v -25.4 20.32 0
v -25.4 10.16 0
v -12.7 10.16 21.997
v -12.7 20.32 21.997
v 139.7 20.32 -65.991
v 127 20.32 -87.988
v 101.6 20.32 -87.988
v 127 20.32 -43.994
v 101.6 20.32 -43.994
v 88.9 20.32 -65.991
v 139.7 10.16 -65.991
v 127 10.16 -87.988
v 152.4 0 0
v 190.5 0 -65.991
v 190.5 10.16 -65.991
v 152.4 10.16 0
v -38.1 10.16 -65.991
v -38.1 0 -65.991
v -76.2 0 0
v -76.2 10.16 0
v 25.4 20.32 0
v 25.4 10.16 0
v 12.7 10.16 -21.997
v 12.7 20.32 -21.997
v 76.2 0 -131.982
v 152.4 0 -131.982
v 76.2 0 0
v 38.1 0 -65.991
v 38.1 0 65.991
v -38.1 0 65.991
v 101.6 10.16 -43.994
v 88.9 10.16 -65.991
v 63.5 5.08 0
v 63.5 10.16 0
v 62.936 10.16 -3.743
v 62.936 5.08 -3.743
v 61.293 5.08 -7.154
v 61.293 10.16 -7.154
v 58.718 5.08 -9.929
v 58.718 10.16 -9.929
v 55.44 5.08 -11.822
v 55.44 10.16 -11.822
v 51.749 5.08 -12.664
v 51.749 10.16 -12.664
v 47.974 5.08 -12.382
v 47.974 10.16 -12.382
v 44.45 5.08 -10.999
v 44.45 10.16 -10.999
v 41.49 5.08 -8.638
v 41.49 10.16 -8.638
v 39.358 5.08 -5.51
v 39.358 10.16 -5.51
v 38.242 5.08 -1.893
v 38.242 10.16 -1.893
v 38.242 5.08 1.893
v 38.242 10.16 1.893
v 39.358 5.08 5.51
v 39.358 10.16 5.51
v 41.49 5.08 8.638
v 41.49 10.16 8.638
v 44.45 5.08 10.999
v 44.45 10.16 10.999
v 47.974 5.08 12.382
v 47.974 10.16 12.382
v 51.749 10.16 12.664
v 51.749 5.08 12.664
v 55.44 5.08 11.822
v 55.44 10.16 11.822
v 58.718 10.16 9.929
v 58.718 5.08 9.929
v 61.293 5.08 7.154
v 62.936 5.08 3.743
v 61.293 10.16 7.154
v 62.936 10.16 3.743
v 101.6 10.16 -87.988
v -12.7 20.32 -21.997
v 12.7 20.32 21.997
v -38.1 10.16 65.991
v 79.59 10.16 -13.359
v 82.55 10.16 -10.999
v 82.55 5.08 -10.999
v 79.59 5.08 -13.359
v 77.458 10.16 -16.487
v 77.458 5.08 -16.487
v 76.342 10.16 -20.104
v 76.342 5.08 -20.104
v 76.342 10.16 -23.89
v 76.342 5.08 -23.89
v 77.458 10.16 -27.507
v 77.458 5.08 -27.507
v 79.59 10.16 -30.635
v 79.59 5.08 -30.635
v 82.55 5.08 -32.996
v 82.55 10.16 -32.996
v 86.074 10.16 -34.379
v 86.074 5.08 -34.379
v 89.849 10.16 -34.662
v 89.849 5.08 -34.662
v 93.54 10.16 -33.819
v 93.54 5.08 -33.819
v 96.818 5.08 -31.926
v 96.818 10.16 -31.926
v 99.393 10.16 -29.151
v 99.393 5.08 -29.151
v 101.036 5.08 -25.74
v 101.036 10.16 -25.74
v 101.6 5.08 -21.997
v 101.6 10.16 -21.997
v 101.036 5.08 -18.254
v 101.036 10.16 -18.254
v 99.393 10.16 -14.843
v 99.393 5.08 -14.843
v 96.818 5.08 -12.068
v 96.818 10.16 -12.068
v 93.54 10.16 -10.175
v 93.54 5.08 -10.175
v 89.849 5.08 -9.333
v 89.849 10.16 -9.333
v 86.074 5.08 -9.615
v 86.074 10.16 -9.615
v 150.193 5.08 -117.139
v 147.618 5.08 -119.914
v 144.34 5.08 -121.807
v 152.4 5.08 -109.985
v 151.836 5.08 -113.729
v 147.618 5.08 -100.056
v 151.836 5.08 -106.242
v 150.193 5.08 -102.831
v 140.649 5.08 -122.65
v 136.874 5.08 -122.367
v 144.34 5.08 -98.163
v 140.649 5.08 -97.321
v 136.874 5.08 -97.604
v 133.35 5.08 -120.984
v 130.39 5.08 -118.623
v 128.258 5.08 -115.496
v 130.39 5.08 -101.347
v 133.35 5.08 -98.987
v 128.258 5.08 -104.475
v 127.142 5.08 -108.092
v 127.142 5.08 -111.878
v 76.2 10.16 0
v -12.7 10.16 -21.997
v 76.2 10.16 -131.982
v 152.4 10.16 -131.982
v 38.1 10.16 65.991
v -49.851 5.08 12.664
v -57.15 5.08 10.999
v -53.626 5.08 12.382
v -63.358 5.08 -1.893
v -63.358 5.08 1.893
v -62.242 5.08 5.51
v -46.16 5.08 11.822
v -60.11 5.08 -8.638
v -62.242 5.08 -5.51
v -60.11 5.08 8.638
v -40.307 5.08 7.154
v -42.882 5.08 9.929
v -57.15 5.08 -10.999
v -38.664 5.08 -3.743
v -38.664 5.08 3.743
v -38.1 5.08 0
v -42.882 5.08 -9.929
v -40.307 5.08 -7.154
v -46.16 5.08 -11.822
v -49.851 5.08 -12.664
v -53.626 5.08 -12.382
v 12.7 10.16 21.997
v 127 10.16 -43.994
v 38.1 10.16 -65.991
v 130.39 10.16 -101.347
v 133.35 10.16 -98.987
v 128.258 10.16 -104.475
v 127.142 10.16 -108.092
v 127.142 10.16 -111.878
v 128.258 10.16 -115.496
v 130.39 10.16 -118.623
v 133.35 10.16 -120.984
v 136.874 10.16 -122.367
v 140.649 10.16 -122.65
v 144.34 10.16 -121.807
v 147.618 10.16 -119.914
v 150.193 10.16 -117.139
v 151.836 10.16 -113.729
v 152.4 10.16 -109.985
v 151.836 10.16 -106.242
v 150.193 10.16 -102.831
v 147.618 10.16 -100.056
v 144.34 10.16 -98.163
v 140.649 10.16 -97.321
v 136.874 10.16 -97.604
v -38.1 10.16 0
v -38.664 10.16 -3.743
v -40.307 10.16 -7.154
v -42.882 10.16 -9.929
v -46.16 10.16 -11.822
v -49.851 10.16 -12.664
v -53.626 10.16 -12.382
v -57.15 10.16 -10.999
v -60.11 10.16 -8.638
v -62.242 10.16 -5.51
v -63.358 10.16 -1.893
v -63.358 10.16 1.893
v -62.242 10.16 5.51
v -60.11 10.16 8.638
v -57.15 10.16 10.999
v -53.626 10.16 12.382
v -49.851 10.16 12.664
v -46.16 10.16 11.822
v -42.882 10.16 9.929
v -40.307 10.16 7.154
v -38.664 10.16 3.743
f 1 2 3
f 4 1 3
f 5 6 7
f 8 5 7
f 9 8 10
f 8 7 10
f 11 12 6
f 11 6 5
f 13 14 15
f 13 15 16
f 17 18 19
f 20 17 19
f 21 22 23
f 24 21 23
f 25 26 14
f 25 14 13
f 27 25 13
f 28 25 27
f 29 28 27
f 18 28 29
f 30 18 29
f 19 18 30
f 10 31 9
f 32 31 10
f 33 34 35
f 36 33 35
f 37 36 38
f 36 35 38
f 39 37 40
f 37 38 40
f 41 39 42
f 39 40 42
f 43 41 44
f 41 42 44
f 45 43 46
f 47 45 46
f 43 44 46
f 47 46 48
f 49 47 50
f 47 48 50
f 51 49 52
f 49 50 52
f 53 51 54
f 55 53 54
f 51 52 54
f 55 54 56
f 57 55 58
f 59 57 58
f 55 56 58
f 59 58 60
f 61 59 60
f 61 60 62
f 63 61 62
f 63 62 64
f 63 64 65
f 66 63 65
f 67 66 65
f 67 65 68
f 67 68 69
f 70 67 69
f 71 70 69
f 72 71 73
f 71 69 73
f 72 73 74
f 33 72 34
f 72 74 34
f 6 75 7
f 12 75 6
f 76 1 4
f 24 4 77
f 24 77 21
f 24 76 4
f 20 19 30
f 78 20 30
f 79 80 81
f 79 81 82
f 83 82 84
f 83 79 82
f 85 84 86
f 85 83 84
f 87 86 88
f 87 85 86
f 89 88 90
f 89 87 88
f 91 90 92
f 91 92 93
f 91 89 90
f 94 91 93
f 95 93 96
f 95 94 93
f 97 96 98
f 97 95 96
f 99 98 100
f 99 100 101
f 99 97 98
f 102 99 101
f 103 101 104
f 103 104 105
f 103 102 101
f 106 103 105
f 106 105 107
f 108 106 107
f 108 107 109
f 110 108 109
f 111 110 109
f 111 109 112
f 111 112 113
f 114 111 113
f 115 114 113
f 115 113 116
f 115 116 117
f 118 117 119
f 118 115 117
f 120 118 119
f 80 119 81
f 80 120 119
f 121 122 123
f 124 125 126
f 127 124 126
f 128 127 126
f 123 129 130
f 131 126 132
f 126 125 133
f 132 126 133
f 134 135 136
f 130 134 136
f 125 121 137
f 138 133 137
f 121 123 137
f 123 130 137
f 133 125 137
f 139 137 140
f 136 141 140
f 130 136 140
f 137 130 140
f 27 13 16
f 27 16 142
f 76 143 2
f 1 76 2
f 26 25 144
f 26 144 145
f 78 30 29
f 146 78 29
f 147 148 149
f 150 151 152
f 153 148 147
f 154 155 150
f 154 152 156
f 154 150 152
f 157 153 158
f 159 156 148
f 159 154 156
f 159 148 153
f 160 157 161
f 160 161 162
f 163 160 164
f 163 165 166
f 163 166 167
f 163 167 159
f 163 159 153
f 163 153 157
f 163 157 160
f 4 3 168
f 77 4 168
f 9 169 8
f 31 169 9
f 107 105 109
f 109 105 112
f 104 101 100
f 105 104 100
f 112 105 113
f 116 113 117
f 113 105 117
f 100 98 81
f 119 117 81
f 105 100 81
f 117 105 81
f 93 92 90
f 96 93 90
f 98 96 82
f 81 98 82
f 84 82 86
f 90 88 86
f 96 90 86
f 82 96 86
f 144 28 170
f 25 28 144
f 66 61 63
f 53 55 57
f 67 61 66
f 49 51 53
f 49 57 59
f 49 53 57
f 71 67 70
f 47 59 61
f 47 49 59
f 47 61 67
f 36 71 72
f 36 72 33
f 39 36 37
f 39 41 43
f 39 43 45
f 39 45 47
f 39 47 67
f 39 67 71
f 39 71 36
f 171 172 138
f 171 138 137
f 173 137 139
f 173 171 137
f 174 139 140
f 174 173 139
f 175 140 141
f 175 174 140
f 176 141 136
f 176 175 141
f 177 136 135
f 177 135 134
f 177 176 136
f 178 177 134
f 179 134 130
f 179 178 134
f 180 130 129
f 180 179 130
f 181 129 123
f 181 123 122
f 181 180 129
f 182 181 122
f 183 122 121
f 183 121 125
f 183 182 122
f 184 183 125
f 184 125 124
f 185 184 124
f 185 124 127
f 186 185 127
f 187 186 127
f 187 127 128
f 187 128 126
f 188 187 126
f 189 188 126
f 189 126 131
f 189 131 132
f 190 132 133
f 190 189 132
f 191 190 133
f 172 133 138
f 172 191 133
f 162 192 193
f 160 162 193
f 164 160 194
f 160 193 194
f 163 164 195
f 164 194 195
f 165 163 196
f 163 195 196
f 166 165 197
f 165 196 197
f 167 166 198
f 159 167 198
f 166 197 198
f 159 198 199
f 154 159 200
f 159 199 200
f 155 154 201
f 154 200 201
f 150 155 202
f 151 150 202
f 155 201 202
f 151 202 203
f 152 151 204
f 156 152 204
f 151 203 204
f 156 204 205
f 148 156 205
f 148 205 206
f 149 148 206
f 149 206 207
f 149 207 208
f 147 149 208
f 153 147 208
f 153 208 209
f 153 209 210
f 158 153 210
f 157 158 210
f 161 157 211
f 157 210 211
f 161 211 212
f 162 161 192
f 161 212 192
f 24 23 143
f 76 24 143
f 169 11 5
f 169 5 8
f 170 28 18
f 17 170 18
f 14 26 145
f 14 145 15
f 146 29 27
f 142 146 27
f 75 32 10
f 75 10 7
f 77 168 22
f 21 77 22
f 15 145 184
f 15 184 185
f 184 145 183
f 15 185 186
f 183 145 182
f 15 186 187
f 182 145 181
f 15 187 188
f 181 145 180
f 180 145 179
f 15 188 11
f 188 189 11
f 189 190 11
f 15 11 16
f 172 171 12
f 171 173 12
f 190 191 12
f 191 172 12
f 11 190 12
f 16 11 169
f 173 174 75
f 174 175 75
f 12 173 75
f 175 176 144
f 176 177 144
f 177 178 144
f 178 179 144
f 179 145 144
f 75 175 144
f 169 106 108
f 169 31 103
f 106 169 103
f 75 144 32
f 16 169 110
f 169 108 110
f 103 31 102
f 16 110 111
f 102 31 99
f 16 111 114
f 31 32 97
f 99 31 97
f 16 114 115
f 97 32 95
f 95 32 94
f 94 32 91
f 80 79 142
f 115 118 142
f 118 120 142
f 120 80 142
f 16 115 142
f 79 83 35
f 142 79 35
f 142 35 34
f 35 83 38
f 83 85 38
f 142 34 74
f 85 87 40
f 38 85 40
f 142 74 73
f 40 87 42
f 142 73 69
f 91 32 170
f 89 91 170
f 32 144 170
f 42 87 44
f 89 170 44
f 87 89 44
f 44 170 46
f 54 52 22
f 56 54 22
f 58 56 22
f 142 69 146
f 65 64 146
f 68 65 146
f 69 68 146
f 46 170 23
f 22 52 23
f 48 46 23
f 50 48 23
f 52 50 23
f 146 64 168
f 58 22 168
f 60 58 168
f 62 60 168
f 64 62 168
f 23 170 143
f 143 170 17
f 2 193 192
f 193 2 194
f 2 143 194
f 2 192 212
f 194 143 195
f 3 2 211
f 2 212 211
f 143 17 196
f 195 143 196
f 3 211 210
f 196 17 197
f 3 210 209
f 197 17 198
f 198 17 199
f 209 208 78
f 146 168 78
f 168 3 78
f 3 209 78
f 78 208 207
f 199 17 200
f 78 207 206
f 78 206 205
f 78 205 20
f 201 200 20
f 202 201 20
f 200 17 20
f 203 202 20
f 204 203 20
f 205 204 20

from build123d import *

# Parameters (mm, degrees)
BOSS_EXTRUDE1_DEPTH = 10.16
SKETCH2_R           = 12.7
CUT_EXTRUDE1_DEPTH  = 5.08
BOSS_EXTRUDE2_DEPTH = 10.16


with BuildPart() as part:
    # Sketch1 → Boss-Extrude1 (new body)
    with BuildSketch(Plane(origin=(0, 0, 0), x_dir=(1, 0, 0), z_dir=(0, 1, 0))):
        Polygon((38.1, 65.991135768), (-38.1, 65.991135768), (-76.2, 0), (-38.1, -65.991135768), (38.1, -65.991135768), (76.2, 0), align=None)
    boss_extrude1 = extrude(amount=BOSS_EXTRUDE1_DEPTH)

    # Sketch2 → Cut-Extrude1 (cut)
    with BuildSketch(Plane(origin=(0, 10.16, 0), x_dir=(1, 0, 0), z_dir=(0, 1, 0))):
        with Locations((-50.8, 0)):
            Circle(SKETCH2_R)
        with Locations((50.8, 0)):
            Circle(SKETCH2_R)
    cut_extrude1 = extrude(amount=-CUT_EXTRUDE1_DEPTH, mode=Mode.SUBTRACT)

    # Mirror1: Boss-Extrude1, Cut-Extrude1 across plane
    add(boss_extrude1.mirror(Plane(origin=(76.2, 10.16, 0), x_dir=(0.5, 0, 0.866025404), z_dir=(-0.866025404, 0, 0.5))))
    add(cut_extrude1.mirror(Plane(origin=(76.2, 10.16, 0), x_dir=(0.5, 0, 0.866025404), z_dir=(-0.866025404, 0, 0.5))), mode=Mode.SUBTRACT)

    # Sketch3 → Boss-Extrude2 (add)
    with BuildSketch(Plane(origin=(0, 10.16, 0), x_dir=(1, 0, 0), z_dir=(0, 1, 0))):
        Polygon((12.7, 21.997045256), (-12.7, 21.997045256), (-25.4, 0), (-12.7, -21.997045256), (12.7, -21.997045256), (25.4, 0), align=None)
    boss_extrude2 = extrude(amount=BOSS_EXTRUDE2_DEPTH)

    # Mirror2: Boss-Extrude2 across plane
    add(boss_extrude2.mirror(Plane(origin=(57.15, 0, -32.995567884), x_dir=(0.5, 0, 0.866025404), z_dir=(0.866025404, 0, -0.5))))


solid = part.part
